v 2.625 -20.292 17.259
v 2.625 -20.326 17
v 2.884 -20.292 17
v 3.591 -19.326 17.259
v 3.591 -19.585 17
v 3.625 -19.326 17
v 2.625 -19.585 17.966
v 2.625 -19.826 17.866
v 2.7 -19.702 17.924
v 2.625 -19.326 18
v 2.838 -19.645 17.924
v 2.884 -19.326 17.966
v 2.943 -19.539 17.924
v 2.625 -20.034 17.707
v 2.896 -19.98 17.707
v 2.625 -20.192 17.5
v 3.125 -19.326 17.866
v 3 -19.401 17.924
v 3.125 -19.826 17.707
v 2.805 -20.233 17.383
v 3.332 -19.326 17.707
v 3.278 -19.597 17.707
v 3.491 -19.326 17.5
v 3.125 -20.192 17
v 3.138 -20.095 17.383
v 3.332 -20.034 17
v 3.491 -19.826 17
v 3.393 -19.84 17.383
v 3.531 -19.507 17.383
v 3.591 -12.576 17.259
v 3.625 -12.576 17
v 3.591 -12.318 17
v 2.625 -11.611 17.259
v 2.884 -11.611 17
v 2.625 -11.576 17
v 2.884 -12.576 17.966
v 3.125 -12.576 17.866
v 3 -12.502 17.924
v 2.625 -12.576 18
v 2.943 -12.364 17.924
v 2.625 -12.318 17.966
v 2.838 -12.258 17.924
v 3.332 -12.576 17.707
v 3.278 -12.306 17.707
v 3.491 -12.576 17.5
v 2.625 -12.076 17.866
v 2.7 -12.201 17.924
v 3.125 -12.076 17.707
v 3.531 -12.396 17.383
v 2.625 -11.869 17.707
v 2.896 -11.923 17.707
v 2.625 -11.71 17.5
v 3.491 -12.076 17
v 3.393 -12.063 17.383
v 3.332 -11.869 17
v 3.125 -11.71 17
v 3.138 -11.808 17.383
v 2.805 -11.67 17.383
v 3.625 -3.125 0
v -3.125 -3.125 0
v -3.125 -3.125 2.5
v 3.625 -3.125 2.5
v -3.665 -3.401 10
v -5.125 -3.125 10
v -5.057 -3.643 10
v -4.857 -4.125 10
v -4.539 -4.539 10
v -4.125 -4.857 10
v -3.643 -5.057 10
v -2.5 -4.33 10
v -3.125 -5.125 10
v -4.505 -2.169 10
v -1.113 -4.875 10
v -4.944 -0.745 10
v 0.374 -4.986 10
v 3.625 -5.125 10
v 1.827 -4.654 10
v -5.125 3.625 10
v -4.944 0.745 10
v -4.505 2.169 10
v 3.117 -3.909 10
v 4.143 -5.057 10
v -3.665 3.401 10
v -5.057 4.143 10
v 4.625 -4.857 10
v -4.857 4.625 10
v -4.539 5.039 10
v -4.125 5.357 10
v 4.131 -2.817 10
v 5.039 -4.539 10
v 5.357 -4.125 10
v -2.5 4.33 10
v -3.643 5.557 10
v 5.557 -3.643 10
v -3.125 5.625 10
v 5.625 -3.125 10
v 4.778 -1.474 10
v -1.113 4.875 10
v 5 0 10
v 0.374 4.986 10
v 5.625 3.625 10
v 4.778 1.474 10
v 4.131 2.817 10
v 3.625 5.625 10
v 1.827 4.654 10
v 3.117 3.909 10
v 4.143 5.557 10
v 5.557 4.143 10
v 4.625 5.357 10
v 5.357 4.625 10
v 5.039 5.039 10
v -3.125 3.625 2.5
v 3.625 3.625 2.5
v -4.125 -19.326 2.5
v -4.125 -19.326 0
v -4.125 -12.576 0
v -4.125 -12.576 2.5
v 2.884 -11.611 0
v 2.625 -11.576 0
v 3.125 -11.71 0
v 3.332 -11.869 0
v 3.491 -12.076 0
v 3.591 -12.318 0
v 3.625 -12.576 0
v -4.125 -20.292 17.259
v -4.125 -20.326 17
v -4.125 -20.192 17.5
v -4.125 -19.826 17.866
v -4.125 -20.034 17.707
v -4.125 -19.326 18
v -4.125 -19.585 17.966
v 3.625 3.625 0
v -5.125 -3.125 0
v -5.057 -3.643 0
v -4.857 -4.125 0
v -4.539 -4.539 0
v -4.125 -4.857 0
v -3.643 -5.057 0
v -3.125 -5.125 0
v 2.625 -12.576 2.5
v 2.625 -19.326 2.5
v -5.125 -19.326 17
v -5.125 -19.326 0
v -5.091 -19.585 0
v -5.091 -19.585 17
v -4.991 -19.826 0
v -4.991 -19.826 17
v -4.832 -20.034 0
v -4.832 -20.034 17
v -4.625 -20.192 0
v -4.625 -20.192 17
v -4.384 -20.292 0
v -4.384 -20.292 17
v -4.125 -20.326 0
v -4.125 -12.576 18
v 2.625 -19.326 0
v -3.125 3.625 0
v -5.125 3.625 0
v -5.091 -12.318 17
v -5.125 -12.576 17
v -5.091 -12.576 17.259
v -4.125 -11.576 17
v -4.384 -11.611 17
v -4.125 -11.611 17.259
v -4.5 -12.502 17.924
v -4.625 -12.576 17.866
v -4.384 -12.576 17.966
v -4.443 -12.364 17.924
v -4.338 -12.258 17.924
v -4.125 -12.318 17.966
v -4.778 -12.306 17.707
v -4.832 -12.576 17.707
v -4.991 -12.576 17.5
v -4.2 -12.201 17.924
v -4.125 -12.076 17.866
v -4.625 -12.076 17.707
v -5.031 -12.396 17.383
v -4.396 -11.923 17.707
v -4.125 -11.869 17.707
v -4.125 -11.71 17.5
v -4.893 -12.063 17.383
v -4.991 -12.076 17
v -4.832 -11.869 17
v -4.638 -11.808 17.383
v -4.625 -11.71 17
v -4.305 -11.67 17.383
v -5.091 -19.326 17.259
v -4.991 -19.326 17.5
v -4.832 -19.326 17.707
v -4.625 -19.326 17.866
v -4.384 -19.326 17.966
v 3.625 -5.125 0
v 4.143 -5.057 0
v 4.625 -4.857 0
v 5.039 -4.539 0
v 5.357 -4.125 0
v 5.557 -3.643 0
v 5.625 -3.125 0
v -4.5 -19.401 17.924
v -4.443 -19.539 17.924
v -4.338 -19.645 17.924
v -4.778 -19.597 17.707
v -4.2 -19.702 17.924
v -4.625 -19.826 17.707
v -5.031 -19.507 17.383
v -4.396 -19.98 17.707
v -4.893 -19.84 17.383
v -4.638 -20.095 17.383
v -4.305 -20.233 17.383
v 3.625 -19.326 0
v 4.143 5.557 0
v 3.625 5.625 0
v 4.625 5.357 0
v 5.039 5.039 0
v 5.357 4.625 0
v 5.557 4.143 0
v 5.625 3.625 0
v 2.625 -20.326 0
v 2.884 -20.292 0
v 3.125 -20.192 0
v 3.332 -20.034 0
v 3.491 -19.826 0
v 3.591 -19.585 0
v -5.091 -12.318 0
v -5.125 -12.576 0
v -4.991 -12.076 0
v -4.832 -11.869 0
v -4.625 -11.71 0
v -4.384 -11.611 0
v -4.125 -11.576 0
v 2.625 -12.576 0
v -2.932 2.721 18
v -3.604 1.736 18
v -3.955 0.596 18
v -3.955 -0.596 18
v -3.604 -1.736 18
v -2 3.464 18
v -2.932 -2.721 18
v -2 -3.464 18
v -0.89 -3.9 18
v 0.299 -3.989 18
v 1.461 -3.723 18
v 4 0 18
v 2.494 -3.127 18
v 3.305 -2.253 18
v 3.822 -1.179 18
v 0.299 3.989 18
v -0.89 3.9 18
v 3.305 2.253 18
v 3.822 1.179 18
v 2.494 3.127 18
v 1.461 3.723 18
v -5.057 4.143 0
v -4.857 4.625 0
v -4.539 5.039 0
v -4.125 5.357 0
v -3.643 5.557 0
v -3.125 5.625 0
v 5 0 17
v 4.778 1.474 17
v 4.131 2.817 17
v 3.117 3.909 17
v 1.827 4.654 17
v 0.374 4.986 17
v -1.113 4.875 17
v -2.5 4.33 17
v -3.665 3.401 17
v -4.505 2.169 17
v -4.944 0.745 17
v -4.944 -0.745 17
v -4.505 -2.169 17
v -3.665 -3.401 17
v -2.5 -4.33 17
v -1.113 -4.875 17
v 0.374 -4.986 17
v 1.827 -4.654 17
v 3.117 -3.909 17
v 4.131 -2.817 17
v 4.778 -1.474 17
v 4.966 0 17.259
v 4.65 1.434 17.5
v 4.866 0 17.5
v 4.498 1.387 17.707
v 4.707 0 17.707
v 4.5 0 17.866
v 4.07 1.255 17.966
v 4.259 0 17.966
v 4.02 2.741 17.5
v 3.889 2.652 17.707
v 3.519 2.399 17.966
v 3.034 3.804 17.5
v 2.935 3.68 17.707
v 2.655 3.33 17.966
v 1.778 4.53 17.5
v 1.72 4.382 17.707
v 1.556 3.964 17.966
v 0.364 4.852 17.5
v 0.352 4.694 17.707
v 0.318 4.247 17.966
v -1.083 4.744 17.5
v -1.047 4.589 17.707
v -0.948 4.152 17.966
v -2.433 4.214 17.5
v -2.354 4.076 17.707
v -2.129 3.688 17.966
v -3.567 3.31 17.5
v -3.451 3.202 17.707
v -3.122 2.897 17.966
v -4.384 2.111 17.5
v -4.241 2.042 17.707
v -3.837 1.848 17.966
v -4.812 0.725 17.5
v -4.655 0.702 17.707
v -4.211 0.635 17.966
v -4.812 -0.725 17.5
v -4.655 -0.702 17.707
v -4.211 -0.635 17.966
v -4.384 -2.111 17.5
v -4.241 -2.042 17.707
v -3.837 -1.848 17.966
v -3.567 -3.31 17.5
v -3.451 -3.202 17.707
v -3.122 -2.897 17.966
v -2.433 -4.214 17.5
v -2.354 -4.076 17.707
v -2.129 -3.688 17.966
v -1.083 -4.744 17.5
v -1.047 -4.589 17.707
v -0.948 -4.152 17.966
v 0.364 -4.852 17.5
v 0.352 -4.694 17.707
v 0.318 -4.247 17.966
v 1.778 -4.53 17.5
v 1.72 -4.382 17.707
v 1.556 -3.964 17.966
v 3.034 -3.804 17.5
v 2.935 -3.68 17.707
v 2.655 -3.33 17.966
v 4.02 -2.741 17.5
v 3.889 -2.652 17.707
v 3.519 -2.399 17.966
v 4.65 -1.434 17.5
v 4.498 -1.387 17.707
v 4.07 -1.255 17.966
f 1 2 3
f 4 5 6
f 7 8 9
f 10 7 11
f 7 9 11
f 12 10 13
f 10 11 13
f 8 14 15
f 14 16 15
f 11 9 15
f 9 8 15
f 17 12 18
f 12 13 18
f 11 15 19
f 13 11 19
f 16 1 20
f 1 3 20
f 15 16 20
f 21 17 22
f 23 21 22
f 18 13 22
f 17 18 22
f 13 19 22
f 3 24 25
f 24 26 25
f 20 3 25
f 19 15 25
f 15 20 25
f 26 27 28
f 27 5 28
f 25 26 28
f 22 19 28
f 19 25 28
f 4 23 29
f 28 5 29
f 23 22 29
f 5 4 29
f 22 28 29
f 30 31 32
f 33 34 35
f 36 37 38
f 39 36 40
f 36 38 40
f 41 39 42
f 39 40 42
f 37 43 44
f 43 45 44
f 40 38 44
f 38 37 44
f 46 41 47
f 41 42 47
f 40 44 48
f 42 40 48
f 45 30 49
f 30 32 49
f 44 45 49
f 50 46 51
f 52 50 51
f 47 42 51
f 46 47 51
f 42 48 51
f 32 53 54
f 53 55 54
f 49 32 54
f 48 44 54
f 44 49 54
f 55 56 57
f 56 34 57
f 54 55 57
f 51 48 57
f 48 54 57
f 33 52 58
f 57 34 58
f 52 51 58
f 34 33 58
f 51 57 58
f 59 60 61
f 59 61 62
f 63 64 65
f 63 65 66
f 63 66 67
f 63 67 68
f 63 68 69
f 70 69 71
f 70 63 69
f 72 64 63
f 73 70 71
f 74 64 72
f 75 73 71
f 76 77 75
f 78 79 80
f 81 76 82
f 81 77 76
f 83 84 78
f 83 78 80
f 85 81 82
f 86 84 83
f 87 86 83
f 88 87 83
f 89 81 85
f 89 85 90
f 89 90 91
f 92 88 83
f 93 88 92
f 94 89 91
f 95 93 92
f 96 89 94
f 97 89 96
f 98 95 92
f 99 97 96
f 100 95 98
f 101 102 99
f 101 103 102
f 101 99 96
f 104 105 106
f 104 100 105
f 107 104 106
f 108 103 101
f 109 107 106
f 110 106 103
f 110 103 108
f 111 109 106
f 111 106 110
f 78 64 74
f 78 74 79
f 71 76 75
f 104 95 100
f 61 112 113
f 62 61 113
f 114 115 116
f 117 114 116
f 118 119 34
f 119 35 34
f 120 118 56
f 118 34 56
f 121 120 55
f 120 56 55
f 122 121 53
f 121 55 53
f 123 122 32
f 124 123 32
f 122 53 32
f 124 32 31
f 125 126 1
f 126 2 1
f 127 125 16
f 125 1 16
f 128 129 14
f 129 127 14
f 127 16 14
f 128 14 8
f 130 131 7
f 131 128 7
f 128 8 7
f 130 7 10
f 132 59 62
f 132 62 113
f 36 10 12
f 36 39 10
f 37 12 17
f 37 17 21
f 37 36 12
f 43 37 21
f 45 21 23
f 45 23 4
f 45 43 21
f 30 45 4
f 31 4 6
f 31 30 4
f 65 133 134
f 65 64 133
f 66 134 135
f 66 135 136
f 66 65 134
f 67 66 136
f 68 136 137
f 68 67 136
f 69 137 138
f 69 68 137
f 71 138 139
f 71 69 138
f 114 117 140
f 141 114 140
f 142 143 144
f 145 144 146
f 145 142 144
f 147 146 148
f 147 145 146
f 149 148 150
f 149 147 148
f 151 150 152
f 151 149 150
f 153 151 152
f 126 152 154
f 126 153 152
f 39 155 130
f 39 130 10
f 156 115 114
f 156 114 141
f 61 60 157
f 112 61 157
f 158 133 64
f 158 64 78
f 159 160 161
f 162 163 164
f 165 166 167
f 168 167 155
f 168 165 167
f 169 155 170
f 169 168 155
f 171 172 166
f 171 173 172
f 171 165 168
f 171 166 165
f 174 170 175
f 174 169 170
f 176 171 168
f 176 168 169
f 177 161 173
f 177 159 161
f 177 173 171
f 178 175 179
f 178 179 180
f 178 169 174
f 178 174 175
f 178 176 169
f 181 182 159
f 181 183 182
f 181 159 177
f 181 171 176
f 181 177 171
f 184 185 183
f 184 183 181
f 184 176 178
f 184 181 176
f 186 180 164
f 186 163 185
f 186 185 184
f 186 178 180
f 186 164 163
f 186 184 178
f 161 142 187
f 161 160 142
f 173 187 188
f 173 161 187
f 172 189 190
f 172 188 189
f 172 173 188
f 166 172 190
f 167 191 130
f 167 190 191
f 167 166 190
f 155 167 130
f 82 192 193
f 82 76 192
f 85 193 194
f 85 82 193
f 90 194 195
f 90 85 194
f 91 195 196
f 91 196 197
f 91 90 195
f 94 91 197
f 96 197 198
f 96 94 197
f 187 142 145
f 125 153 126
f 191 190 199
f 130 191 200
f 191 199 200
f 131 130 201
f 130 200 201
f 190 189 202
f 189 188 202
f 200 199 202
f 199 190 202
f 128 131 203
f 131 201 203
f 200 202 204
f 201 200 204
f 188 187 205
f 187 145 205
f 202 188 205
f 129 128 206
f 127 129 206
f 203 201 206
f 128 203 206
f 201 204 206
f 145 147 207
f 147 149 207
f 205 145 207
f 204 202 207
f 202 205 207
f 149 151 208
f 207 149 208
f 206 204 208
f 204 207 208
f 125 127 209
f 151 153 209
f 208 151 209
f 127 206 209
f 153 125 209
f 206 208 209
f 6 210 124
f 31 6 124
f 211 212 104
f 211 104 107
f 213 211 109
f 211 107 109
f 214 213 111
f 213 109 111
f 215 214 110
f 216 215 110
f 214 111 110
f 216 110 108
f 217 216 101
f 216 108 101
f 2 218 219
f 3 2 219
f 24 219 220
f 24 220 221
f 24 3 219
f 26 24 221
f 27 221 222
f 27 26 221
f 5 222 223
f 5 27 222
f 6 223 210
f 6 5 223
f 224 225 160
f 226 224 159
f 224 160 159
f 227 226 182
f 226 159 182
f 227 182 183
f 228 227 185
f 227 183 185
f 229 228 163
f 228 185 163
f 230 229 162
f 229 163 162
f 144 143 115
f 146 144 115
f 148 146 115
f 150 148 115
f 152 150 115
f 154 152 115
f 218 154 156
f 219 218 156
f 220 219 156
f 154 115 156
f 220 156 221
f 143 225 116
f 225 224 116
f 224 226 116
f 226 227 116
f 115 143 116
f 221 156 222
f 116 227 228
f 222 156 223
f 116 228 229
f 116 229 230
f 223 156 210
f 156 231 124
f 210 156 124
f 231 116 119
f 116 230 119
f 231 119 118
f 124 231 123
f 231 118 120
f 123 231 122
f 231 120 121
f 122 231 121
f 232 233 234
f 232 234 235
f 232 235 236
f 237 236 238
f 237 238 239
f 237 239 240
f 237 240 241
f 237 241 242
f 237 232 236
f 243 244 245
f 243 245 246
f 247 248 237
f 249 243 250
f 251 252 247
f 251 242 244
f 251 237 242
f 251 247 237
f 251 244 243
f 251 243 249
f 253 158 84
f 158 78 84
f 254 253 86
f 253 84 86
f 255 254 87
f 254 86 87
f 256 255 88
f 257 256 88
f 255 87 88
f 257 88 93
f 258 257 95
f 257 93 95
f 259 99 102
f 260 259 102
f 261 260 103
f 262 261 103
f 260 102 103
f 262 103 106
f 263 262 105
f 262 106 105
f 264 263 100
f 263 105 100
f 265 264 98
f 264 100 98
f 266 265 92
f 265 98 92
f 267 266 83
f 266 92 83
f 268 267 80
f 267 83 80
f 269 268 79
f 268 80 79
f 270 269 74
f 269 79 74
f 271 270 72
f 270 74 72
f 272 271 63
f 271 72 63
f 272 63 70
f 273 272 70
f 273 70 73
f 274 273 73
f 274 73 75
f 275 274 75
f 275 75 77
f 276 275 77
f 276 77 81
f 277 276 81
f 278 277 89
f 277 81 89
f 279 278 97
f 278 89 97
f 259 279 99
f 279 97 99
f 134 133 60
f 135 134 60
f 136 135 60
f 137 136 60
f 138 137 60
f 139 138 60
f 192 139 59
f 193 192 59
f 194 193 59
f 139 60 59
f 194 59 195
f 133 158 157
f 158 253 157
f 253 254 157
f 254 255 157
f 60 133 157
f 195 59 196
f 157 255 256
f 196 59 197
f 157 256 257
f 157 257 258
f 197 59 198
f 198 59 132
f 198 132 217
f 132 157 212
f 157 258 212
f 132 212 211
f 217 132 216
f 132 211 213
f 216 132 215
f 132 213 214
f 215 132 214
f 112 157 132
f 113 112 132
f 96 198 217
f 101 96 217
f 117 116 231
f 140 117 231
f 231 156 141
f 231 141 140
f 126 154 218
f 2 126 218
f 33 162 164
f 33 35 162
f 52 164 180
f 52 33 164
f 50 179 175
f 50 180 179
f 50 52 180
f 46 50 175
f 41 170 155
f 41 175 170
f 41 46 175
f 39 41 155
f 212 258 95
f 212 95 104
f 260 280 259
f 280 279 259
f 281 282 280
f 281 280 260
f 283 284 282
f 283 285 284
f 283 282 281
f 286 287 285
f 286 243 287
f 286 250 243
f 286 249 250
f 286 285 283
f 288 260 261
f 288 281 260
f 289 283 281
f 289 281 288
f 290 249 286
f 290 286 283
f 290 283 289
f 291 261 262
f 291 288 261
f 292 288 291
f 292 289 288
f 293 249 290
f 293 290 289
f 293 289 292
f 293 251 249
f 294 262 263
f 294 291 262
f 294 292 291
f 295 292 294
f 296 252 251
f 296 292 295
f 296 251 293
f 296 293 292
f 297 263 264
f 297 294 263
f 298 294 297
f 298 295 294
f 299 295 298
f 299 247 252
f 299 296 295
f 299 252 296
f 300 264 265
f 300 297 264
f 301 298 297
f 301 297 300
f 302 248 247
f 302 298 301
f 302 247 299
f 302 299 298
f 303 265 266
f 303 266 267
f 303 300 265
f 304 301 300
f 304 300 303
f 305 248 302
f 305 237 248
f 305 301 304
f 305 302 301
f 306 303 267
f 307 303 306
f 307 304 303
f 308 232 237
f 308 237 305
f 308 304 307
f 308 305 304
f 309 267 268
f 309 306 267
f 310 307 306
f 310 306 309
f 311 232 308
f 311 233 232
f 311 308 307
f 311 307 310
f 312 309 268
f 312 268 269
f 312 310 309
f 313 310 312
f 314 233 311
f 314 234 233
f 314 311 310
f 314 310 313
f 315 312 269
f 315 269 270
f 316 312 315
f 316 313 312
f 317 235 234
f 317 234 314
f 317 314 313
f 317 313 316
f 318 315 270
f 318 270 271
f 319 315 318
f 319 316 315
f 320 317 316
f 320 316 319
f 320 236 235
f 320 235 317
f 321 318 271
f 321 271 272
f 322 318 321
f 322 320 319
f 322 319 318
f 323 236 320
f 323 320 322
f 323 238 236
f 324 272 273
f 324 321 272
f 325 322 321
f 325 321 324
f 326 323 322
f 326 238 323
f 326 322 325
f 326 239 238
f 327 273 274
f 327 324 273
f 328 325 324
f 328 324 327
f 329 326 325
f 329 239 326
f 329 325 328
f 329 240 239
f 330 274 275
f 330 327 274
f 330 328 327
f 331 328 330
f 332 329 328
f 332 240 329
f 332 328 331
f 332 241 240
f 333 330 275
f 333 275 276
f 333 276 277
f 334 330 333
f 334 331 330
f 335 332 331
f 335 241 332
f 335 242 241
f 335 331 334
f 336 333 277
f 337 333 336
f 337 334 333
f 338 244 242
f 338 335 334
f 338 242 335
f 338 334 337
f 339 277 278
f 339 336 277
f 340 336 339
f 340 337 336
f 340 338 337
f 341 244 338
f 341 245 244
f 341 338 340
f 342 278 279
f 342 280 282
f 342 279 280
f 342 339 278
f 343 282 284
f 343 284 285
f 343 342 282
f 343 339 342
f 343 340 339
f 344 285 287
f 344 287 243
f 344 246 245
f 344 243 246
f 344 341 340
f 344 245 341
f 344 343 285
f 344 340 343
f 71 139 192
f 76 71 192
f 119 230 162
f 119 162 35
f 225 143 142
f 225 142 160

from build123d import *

# Parameters (mm, degrees)
F0_W     = 10.75
F0_H     = 10.75
F0_W_2   = 6.75
F0_H_2   = 6.75
F1_DEPTH = 10
F2_DEPTH = 2.5
F3_R     = 5
F4_DEPTH = 8
F5_R     = 2
F6_R     = 1
F7_W     = 8.75
F7_H     = 8.75
F7_W_2   = 6.75
F7_H_2   = 6.75
F8_DEPTH = 18
F9_DEPTH = 2.5
F10_R    = 1


with BuildPart() as f1:
    # F0 (on Top) → F1 (new body)
    with BuildSketch(Plane.XY):
        with Locations((0.25, 0.25)):
            Rectangle(F0_W, F0_H)
        with Locations((0.25, 0.25)):
            Rectangle(F0_W_2, F0_H_2, mode=Mode.SUBTRACT)
        with Locations((0.25, 0.25)):
            Rectangle(F0_W_2, F0_H_2)
    extrude(amount=F1_DEPTH)

    # F0 (on Top) → F2 (cut)
    with BuildSketch(Plane.XY):
        with Locations((0.25, 0.25)):
            Rectangle(F0_W_2, F0_H_2)
    extrude(amount=F2_DEPTH, mode=Mode.SUBTRACT)

    # F3 (on face) → F4 (join)
    with BuildSketch(Plane.XY.offset(10)):
        Circle(F3_R)
    extrude(amount=F4_DEPTH)

    # F5
    f5_edges = [f1.edges().sort_by_distance(p)[0] for p in [
        (-5.125, -5.125, 5),
        (5.625, -5.125, 5),
        (5.625, 5.625, 5),
        (-5.125, 5.625, 5),
    ]]
    fillet(f5_edges, radius=F5_R)

    # F6
    f6_edges = [f1.edges().sort_by_distance(p)[0] for p in [
        (-5, 0, 18),
    ]]
    fillet(f6_edges, radius=F6_R)


with BuildPart() as f8:
    # F7 (on Top) → F8 (new body)
    with BuildSketch(Plane.XY):
        with Locations((-0.75, -15.951462)):
            Rectangle(F7_W, F7_H)
        with Locations((-0.75, -15.951462)):
            Rectangle(F7_W_2, F7_H_2, mode=Mode.SUBTRACT)
        with Locations((-0.75, -15.951462)):
            Rectangle(F7_W_2, F7_H_2)
    extrude(amount=F8_DEPTH)

    # F7 (on Top) → F9 (cut)
    with BuildSketch(Plane.XY):
        with Locations((-0.75, -15.951462)):
            Rectangle(F7_W_2, F7_H_2)
    extrude(amount=F9_DEPTH, mode=Mode.SUBTRACT)

    # F10
    f10_edges = [f8.edges().sort_by_distance(p)[0] for p in [
        (-5.125, -11.576462, 9),
        (3.625, -11.576462, 9),
        (-5.125, -20.326462, 9),
        (3.625, -20.326462, 9),
        (-5.125, -15.951462, 18),
        (-0.75, -20.326462, 18),
        (3.625, -15.951462, 18),
        (-0.75, -11.576462, 18),
    ]]
    fillet(f10_edges, radius=F10_R)


solid = Compound([f1.part, f8.part])
